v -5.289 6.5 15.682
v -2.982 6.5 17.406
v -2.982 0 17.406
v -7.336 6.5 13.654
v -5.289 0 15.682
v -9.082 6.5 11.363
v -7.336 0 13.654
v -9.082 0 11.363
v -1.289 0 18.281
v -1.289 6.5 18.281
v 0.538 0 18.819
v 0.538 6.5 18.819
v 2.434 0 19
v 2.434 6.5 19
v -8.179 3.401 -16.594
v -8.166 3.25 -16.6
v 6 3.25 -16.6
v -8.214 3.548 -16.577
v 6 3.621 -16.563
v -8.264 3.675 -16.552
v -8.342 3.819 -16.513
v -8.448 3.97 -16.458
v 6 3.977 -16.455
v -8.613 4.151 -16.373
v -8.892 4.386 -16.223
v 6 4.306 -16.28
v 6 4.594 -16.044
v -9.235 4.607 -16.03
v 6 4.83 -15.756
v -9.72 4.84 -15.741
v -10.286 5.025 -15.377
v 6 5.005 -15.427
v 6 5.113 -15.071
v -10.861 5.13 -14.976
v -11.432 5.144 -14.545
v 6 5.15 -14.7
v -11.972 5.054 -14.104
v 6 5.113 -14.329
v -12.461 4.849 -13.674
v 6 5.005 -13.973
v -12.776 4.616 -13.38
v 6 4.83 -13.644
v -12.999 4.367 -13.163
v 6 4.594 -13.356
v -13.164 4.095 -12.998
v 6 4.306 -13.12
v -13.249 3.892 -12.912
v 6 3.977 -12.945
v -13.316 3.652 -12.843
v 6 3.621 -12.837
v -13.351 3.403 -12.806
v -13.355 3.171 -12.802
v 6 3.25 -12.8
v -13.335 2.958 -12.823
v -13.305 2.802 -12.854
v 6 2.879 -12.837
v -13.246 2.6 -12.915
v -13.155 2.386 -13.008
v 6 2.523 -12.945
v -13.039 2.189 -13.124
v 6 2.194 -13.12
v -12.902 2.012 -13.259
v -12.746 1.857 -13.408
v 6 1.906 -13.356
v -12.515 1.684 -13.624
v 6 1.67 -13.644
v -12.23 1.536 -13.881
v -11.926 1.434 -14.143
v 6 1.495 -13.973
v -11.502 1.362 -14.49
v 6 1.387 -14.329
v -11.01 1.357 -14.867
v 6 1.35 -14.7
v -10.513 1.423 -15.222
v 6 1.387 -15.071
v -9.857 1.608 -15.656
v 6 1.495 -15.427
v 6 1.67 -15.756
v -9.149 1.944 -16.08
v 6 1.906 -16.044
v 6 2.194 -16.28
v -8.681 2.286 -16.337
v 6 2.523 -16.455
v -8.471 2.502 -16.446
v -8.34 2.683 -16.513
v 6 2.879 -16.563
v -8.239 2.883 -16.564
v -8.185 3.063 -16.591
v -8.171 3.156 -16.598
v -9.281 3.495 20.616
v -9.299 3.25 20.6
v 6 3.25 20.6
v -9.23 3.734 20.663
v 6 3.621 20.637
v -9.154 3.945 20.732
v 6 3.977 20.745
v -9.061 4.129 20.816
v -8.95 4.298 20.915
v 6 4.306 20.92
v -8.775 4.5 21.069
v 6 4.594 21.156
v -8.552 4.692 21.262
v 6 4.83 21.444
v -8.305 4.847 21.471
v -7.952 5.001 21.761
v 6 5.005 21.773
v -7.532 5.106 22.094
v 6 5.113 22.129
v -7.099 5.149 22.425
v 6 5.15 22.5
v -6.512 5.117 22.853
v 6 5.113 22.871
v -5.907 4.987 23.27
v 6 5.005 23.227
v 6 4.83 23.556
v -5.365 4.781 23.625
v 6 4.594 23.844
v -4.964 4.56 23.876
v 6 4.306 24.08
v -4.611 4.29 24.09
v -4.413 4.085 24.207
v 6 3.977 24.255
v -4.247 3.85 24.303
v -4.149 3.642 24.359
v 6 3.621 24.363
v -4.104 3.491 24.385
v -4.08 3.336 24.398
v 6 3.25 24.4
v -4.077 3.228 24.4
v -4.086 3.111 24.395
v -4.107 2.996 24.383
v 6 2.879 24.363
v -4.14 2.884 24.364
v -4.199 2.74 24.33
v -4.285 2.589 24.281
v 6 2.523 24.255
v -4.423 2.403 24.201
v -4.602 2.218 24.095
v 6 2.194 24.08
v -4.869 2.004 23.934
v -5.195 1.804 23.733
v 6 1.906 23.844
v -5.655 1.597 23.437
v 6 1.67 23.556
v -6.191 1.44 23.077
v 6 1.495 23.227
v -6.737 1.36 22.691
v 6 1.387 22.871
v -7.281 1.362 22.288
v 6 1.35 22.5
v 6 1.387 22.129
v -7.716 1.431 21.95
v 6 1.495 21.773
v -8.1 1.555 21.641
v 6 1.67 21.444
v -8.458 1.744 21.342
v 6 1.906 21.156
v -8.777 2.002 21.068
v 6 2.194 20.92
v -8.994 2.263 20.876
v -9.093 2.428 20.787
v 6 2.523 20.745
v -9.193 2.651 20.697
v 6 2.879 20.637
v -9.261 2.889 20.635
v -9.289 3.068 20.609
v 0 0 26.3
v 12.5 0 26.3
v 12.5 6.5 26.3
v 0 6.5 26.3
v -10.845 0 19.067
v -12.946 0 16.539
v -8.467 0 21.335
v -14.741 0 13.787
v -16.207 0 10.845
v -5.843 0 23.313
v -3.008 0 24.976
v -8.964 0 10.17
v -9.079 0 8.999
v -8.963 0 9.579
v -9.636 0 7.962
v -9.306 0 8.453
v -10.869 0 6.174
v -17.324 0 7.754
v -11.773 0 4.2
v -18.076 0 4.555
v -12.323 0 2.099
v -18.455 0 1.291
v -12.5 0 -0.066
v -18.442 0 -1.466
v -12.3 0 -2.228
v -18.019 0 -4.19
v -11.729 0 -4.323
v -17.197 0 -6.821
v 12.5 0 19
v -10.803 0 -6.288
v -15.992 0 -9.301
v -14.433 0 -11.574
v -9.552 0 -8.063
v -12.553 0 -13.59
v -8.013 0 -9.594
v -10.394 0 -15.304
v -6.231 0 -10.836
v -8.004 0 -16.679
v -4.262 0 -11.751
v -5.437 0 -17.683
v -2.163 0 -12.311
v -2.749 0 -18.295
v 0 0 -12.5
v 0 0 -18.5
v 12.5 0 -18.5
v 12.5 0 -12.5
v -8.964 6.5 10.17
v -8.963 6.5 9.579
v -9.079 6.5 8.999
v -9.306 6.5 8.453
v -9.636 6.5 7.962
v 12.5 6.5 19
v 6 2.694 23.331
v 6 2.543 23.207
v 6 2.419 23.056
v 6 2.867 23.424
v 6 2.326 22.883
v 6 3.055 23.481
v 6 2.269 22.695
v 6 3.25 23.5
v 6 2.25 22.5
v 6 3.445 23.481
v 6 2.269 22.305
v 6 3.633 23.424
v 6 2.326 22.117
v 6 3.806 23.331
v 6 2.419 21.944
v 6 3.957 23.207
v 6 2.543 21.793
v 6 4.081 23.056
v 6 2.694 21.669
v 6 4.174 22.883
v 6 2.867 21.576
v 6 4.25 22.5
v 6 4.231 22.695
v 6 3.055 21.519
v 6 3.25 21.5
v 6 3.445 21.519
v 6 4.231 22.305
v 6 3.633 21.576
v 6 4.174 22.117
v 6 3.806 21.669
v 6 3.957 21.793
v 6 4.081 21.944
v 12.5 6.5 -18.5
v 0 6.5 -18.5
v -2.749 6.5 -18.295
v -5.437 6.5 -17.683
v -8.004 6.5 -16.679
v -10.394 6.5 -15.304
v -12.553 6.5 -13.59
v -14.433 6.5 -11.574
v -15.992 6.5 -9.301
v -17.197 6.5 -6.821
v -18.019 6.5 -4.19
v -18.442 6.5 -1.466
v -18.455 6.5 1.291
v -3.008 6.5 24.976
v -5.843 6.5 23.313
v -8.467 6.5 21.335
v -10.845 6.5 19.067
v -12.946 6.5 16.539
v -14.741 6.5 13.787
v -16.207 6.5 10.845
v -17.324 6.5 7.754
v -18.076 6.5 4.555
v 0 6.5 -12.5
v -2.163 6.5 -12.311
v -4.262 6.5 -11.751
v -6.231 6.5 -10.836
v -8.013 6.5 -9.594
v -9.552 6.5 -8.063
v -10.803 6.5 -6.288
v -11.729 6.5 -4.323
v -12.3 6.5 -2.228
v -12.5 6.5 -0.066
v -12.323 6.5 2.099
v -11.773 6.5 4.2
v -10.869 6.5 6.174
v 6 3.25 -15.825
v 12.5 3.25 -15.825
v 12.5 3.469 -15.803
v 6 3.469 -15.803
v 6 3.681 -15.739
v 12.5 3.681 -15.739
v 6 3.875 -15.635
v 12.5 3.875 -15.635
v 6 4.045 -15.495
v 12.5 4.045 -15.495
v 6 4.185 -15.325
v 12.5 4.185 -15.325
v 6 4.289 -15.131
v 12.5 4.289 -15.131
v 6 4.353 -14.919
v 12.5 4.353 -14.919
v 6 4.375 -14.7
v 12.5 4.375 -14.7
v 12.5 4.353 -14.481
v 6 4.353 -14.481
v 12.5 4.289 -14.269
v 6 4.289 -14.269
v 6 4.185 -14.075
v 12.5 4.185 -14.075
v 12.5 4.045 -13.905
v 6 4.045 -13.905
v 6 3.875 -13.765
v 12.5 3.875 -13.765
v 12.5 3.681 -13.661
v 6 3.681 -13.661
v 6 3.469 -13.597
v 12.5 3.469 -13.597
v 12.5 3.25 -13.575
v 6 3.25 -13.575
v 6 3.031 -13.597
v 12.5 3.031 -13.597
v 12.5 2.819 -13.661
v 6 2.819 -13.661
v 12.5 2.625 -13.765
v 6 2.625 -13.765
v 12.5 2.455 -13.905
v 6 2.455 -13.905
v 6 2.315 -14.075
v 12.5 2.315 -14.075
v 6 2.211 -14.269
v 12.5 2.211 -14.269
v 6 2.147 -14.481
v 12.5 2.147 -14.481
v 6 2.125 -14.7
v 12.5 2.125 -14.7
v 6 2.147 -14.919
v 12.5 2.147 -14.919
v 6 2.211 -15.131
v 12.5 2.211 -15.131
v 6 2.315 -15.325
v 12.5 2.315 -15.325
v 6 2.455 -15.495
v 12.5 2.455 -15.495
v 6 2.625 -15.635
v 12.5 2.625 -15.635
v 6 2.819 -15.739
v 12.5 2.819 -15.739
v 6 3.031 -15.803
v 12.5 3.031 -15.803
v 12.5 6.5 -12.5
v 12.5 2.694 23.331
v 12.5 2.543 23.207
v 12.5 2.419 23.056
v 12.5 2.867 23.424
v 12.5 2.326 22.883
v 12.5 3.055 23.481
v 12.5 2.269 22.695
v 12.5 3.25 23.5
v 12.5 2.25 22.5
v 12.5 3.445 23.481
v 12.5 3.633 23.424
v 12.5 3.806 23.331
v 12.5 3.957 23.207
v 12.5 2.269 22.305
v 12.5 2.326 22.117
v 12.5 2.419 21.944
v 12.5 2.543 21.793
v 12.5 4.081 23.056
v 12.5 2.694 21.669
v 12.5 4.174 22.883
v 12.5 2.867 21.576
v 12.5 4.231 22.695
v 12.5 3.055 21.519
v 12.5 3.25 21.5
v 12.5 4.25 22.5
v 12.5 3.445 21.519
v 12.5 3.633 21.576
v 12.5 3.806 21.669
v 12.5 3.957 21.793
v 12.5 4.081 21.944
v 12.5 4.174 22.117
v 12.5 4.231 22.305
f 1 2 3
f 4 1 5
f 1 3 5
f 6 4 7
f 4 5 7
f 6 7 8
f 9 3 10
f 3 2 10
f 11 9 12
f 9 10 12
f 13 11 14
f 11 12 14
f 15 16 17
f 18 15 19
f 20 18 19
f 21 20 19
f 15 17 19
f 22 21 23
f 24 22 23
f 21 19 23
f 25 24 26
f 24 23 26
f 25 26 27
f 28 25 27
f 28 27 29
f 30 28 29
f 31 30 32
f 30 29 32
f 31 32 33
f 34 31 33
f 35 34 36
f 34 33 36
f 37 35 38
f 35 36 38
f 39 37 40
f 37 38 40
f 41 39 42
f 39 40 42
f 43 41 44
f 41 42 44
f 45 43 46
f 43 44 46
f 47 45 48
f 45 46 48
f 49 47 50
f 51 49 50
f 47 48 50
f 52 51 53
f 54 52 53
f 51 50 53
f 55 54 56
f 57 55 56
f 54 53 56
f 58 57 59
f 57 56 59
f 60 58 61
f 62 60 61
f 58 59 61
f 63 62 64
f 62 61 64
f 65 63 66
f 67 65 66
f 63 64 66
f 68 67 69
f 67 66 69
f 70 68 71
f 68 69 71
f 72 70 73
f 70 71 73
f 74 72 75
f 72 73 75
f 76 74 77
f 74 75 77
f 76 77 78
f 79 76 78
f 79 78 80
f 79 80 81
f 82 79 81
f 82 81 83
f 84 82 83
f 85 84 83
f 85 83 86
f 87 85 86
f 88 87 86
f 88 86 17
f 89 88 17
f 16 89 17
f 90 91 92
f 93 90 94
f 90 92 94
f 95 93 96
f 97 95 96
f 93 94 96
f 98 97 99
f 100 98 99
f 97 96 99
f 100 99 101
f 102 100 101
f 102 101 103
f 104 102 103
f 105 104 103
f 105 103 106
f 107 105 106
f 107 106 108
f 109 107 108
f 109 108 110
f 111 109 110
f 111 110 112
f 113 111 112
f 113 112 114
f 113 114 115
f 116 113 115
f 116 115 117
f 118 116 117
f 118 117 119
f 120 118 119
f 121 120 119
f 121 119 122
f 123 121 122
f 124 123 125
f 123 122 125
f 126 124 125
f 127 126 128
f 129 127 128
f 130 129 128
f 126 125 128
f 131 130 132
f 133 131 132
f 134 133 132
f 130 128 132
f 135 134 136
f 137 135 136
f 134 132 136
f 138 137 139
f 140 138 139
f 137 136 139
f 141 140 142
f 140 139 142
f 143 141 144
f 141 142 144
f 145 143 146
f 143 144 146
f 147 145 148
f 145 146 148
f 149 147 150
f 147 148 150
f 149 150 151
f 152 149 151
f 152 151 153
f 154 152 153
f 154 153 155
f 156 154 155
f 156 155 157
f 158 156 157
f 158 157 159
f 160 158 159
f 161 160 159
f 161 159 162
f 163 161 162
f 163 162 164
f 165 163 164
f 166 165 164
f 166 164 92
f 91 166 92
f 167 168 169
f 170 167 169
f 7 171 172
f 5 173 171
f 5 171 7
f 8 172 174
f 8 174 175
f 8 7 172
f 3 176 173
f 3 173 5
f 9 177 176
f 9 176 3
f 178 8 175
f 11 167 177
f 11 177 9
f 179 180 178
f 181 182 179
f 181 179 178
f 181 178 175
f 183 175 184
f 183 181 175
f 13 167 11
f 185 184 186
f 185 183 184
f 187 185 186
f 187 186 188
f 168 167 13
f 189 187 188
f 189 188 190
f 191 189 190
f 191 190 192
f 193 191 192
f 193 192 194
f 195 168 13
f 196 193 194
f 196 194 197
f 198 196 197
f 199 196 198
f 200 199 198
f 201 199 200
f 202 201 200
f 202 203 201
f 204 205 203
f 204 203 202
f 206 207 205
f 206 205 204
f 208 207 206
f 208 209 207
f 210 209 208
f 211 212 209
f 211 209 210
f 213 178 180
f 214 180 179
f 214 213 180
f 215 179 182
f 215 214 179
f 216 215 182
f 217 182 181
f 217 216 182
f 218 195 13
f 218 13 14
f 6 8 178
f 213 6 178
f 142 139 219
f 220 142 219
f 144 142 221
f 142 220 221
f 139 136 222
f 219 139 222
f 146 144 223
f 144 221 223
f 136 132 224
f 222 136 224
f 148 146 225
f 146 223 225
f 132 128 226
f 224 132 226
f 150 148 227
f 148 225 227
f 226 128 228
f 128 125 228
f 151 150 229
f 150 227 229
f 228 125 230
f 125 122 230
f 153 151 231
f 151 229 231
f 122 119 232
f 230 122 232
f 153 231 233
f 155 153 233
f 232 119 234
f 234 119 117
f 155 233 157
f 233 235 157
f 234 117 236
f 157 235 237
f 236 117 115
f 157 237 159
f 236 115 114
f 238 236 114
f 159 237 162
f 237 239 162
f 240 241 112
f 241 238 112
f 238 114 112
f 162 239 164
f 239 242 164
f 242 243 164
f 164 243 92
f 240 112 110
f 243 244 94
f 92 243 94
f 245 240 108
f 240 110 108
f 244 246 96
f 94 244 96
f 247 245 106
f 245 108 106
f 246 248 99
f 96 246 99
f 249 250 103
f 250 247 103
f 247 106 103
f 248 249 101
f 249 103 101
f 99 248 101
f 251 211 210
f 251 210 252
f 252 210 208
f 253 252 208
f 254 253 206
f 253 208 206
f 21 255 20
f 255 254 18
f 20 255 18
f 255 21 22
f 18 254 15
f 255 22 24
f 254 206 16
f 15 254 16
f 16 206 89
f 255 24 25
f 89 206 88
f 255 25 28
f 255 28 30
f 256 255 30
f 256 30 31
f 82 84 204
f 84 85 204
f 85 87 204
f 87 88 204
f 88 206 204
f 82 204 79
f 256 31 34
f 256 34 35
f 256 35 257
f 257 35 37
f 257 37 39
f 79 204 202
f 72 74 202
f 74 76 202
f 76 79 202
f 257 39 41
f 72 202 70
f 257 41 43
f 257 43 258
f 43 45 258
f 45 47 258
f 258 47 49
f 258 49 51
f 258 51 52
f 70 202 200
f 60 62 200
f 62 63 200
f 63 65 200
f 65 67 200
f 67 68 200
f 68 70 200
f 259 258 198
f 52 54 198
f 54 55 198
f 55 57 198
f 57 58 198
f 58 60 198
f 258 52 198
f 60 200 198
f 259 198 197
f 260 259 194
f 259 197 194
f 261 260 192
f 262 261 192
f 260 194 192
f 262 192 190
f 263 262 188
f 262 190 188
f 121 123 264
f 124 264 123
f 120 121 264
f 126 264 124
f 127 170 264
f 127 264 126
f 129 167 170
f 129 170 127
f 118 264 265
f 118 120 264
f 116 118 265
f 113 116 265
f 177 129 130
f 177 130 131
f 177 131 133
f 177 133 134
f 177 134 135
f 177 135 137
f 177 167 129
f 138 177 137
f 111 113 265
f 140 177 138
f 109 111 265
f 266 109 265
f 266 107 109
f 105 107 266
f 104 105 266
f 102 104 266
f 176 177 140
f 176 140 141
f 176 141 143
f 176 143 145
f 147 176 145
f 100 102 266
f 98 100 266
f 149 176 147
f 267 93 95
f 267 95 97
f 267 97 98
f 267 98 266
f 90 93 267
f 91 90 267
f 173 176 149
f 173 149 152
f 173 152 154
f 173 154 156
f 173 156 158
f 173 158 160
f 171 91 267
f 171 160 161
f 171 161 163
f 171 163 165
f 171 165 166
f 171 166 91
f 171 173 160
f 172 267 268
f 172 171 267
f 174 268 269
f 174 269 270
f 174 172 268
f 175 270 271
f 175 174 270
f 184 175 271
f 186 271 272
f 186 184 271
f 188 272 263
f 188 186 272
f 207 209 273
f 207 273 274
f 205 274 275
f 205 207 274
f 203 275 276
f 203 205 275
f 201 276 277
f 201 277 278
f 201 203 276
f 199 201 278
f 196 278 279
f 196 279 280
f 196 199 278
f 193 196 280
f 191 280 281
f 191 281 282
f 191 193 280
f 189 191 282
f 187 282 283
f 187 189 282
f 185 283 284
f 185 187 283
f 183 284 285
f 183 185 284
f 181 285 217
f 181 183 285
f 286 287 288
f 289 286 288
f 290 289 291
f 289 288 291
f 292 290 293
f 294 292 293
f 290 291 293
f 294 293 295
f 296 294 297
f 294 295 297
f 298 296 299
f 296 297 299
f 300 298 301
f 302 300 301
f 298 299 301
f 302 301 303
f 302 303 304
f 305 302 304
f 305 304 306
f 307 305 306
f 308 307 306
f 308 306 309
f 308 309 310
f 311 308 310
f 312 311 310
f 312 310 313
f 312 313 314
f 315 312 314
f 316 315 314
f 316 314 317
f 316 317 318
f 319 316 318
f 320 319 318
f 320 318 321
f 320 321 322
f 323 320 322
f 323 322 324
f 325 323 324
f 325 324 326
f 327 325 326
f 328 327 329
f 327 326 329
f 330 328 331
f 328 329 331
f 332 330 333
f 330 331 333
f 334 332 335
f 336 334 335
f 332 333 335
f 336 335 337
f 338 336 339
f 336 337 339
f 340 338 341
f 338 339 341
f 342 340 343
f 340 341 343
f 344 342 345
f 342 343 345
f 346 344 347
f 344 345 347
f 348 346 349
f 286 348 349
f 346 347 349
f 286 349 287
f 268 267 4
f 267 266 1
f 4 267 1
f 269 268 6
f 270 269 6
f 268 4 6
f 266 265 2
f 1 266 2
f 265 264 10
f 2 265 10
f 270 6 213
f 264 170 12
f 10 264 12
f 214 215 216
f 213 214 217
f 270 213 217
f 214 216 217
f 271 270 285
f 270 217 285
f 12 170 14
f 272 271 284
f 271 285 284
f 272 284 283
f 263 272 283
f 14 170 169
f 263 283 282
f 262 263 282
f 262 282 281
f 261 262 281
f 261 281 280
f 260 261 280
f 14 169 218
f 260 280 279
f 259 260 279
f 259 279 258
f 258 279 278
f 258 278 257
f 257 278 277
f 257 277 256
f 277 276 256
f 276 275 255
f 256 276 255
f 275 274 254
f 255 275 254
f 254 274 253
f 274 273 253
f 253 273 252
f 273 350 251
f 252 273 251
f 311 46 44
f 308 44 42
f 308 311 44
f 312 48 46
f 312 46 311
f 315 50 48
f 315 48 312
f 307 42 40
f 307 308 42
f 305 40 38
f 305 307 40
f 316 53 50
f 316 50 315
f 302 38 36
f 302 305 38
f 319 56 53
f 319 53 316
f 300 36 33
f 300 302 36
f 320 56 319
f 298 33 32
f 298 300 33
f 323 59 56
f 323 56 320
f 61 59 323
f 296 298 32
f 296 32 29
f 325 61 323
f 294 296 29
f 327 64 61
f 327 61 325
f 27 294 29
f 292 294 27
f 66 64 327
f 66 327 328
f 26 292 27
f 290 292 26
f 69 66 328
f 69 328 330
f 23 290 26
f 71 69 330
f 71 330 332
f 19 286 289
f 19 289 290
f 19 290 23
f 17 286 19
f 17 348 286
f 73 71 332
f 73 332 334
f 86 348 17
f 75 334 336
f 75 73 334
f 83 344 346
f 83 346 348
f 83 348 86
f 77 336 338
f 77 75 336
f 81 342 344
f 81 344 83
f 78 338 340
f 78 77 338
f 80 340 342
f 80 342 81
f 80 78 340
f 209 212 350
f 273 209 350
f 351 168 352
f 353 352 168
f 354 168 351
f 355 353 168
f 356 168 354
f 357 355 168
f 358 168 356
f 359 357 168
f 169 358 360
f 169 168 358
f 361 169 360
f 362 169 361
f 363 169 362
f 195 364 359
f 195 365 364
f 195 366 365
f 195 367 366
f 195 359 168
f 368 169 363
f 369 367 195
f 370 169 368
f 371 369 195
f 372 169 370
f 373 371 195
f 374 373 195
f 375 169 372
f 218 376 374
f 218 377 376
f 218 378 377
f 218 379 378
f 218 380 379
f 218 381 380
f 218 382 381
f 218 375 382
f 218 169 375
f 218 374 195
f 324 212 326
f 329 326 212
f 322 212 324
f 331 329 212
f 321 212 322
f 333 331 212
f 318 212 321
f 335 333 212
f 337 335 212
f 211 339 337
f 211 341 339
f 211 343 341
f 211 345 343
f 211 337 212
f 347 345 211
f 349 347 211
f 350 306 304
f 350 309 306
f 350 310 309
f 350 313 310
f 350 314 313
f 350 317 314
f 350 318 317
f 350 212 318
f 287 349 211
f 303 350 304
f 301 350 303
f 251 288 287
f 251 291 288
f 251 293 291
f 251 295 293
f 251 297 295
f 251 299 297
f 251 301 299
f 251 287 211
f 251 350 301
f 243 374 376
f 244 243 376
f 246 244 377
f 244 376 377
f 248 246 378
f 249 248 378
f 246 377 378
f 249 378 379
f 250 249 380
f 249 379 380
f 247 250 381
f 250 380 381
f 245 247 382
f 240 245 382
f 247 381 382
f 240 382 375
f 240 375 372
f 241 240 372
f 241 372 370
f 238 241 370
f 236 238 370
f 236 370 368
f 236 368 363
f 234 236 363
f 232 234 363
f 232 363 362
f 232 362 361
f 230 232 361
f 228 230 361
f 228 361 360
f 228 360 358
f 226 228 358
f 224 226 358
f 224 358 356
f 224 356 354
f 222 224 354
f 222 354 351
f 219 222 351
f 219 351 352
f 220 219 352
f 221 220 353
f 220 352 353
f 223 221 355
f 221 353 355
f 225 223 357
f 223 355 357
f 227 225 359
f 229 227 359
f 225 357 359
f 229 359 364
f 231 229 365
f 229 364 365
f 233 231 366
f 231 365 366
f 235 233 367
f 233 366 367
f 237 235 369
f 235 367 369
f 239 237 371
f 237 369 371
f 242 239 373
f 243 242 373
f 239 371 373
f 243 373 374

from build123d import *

# Parameters (mm, degrees)
SKETCH1_R               = 18.5
SKETCH1_R_2             = 12.5
BOSS_EXTRUDE1_DEPTH     = 6.5
SKETCH2_R               = 46.70286463
CUT_EXTRUDE1_DEPTH      = 27.958301133
CUT_EXTRUDE2_DEPTH      = 27.958301133
CUT_EXTRUDE2_DEPTH_BACK = 27.958301133
SKETCH3_R               = 1.125
SKETCH4_R               = 1.9
CUT_EXTRUDE3_DEPTH      = 23.989128026
BOSS_EXTRUDE2_START     = 12.5
SKETCH6_W               = 6
SKETCH6_H               = 6.5
SKETCH6_R               = 1.125
BOSS_EXTRUDE2_DEPTH     = 12.5
CUT_EXTRUDE4_START      = -12.5
SKETCH7_R               = 1.9
CUT_EXTRUDE4_DEPTH      = 12.5
BOSS_EXTRUDE3_DEPTH     = 6.5
CUT_EXTRUDE7_DEPTH      = 12.5
FILLET2_R               = 3
SKETCH14_R              = 1
CUT_EXTRUDE9_DEPTH      = 33.805335008
BOSS_EXTRUDE4_START     = 12.5
SKETCH15_W              = 7.3
SKETCH15_H              = 6.5
SKETCH15_R              = 1
BOSS_EXTRUDE4_DEPTH     = 12.5
FILLET3_R               = 10
SKETCH16_R              = 1.9
CUT_EXTRUDE11_DEPTH     = 37.526565832


with BuildPart() as part:
    # Sketch1 → Boss-Extrude1 (new body)
    with BuildSketch(Plane(origin=(0, 0, 0), x_dir=(1, 0, 0), z_dir=(0, 1, 0))):
        with Locations(Location((0, 0, 0), (0, 0, 90))):
            Circle(SKETCH1_R)
        with Locations(Location((0, 0, 0), (0, 0, 90))):
            Circle(SKETCH1_R_2, mode=Mode.SUBTRACT)
    extrude(amount=BOSS_EXTRUDE1_DEPTH)

    # Sketch2 → Cut-Extrude1 (cut, through all)
    with BuildSketch(Plane(origin=(0, 0, 0), x_dir=(0, 0, -1), z_dir=(1, 0, 0))):
        Circle(SKETCH2_R)
    extrude(amount=CUT_EXTRUDE1_DEPTH, mode=Mode.SUBTRACT)

    # Sketch3 → Cut-Extrude2 (cut, two sides: drawn at the far end of the back side and taken through both)
    with BuildSketch(Plane(origin=(0, 0, 0), x_dir=(0, 0, -1), z_dir=(1, 0, 0)).offset(-CUT_EXTRUDE2_DEPTH_BACK)):
        with Locations((14.7, 3.25)):
            Circle(SKETCH3_R)
    extrude(amount=CUT_EXTRUDE2_DEPTH + CUT_EXTRUDE2_DEPTH_BACK, mode=Mode.SUBTRACT)

    # Sketch4 → Cut-Extrude3 (cut, through all)
    with BuildSketch(Plane(origin=(-6.5, 0, 0), x_dir=(0, 0, -1), z_dir=(1, 0, 0))):
        with Locations((14.7, 3.25)):
            Circle(SKETCH4_R)
    extrude(amount=-CUT_EXTRUDE3_DEPTH, mode=Mode.SUBTRACT)

    # Sketch6 → Boss-Extrude2 (add)
    with BuildSketch(Plane(origin=(0, 0, 0), x_dir=(0, 0, -1), z_dir=(1, 0, 0)).offset(BOSS_EXTRUDE2_START)):
        with Locations((15.5, 3.25)):
            Rectangle(SKETCH6_W, SKETCH6_H)
        with Locations((14.7, 3.25)):
            Circle(SKETCH6_R, mode=Mode.SUBTRACT)
    extrude(amount=-BOSS_EXTRUDE2_DEPTH)

    # Sketch7 → Cut-Extrude4 (cut)
    with BuildSketch(Plane.ZY.offset(6.5).offset(CUT_EXTRUDE4_START)):
        with Locations(Location((-14.7, 3.25, 0), (0, 0, 180))):
            Circle(SKETCH7_R)
    extrude(amount=CUT_EXTRUDE4_DEPTH, mode=Mode.SUBTRACT)

    # Sketch11 → Boss-Extrude3 (add)
    with BuildSketch(Plane(origin=(0, 0, 0), x_dir=(1, 0, 0), z_dir=(0, 1, 0))):
        with BuildLine():
            Line((0, -18.5), (0, -26.3))
            ThreePointArc((0, -26.3), (-13.323632383, -16.015482855), (-18.5, 0))
            ThreePointArc((-18.5, 0), (-13.015505379, -13.015505379), (0, -18.5))
        make_face()
    extrude(amount=BOSS_EXTRUDE3_DEPTH)

    # Sketch13 → Cut-Extrude7 (cut)
    with BuildSketch(Plane(origin=(0, 0, 0), x_dir=(-1, 0, 0), z_dir=(0, -1, 0))):
        with BuildLine():
            ThreePointArc((8.831682782, -8.845980965), (4.778872144, -11.550427742), (0, -12.5))
            Line((0, -12.5), (0, -19))
            ThreePointArc((0, -19), (5.098309427, -15.844292422), (9.082430599, -11.363441184))
            Line((9.082430599, -11.363441184), (8.831682782, -8.845980965))
        make_face()
    extrude(amount=-CUT_EXTRUDE7_DEPTH, mode=Mode.SUBTRACT)

    # Fillet2
    fillet2_edges = [part.edges().sort_by_distance(p)[0] for p in [
        (-8.831682782, 3.25, 8.845980965),
    ]]
    fillet(fillet2_edges, radius=FILLET2_R)

    # Sketch14 → Cut-Extrude9 (cut, through all)
    with BuildSketch(Plane(origin=(0, 0, 0), x_dir=(0, 0, -1), z_dir=(1, 0, 0))):
        with Locations((-22.5, 3.25)):
            Circle(SKETCH14_R)
    extrude(amount=-CUT_EXTRUDE9_DEPTH, mode=Mode.SUBTRACT)

    # Sketch15 → Boss-Extrude4 (add)
    with BuildSketch(Plane(origin=(0, 0, 0), x_dir=(0, 0, -1), z_dir=(1, 0, 0)).offset(BOSS_EXTRUDE4_START)):
        with Locations((-22.65, 3.25)):
            Rectangle(SKETCH15_W, SKETCH15_H)
        with Locations((-22.5, 3.25)):
            Circle(SKETCH15_R, mode=Mode.SUBTRACT)
    extrude(amount=-BOSS_EXTRUDE4_DEPTH)

    # Fillet3
    fillet3_edges = [part.edges().sort_by_distance(p)[0] for p in [
        (0, 3.25, 19),
    ]]
    fillet(fillet3_edges, radius=FILLET3_R)

    # Sketch16 → Cut-Extrude11 (cut, through all)
    with BuildSketch(Plane(origin=(6, 0, 0), x_dir=(0, 0, -1), z_dir=(1, 0, 0))):
        with Locations((-22.5, 3.25)):
            Circle(SKETCH16_R)
    extrude(amount=-CUT_EXTRUDE11_DEPTH, mode=Mode.SUBTRACT)


solid = part.part
